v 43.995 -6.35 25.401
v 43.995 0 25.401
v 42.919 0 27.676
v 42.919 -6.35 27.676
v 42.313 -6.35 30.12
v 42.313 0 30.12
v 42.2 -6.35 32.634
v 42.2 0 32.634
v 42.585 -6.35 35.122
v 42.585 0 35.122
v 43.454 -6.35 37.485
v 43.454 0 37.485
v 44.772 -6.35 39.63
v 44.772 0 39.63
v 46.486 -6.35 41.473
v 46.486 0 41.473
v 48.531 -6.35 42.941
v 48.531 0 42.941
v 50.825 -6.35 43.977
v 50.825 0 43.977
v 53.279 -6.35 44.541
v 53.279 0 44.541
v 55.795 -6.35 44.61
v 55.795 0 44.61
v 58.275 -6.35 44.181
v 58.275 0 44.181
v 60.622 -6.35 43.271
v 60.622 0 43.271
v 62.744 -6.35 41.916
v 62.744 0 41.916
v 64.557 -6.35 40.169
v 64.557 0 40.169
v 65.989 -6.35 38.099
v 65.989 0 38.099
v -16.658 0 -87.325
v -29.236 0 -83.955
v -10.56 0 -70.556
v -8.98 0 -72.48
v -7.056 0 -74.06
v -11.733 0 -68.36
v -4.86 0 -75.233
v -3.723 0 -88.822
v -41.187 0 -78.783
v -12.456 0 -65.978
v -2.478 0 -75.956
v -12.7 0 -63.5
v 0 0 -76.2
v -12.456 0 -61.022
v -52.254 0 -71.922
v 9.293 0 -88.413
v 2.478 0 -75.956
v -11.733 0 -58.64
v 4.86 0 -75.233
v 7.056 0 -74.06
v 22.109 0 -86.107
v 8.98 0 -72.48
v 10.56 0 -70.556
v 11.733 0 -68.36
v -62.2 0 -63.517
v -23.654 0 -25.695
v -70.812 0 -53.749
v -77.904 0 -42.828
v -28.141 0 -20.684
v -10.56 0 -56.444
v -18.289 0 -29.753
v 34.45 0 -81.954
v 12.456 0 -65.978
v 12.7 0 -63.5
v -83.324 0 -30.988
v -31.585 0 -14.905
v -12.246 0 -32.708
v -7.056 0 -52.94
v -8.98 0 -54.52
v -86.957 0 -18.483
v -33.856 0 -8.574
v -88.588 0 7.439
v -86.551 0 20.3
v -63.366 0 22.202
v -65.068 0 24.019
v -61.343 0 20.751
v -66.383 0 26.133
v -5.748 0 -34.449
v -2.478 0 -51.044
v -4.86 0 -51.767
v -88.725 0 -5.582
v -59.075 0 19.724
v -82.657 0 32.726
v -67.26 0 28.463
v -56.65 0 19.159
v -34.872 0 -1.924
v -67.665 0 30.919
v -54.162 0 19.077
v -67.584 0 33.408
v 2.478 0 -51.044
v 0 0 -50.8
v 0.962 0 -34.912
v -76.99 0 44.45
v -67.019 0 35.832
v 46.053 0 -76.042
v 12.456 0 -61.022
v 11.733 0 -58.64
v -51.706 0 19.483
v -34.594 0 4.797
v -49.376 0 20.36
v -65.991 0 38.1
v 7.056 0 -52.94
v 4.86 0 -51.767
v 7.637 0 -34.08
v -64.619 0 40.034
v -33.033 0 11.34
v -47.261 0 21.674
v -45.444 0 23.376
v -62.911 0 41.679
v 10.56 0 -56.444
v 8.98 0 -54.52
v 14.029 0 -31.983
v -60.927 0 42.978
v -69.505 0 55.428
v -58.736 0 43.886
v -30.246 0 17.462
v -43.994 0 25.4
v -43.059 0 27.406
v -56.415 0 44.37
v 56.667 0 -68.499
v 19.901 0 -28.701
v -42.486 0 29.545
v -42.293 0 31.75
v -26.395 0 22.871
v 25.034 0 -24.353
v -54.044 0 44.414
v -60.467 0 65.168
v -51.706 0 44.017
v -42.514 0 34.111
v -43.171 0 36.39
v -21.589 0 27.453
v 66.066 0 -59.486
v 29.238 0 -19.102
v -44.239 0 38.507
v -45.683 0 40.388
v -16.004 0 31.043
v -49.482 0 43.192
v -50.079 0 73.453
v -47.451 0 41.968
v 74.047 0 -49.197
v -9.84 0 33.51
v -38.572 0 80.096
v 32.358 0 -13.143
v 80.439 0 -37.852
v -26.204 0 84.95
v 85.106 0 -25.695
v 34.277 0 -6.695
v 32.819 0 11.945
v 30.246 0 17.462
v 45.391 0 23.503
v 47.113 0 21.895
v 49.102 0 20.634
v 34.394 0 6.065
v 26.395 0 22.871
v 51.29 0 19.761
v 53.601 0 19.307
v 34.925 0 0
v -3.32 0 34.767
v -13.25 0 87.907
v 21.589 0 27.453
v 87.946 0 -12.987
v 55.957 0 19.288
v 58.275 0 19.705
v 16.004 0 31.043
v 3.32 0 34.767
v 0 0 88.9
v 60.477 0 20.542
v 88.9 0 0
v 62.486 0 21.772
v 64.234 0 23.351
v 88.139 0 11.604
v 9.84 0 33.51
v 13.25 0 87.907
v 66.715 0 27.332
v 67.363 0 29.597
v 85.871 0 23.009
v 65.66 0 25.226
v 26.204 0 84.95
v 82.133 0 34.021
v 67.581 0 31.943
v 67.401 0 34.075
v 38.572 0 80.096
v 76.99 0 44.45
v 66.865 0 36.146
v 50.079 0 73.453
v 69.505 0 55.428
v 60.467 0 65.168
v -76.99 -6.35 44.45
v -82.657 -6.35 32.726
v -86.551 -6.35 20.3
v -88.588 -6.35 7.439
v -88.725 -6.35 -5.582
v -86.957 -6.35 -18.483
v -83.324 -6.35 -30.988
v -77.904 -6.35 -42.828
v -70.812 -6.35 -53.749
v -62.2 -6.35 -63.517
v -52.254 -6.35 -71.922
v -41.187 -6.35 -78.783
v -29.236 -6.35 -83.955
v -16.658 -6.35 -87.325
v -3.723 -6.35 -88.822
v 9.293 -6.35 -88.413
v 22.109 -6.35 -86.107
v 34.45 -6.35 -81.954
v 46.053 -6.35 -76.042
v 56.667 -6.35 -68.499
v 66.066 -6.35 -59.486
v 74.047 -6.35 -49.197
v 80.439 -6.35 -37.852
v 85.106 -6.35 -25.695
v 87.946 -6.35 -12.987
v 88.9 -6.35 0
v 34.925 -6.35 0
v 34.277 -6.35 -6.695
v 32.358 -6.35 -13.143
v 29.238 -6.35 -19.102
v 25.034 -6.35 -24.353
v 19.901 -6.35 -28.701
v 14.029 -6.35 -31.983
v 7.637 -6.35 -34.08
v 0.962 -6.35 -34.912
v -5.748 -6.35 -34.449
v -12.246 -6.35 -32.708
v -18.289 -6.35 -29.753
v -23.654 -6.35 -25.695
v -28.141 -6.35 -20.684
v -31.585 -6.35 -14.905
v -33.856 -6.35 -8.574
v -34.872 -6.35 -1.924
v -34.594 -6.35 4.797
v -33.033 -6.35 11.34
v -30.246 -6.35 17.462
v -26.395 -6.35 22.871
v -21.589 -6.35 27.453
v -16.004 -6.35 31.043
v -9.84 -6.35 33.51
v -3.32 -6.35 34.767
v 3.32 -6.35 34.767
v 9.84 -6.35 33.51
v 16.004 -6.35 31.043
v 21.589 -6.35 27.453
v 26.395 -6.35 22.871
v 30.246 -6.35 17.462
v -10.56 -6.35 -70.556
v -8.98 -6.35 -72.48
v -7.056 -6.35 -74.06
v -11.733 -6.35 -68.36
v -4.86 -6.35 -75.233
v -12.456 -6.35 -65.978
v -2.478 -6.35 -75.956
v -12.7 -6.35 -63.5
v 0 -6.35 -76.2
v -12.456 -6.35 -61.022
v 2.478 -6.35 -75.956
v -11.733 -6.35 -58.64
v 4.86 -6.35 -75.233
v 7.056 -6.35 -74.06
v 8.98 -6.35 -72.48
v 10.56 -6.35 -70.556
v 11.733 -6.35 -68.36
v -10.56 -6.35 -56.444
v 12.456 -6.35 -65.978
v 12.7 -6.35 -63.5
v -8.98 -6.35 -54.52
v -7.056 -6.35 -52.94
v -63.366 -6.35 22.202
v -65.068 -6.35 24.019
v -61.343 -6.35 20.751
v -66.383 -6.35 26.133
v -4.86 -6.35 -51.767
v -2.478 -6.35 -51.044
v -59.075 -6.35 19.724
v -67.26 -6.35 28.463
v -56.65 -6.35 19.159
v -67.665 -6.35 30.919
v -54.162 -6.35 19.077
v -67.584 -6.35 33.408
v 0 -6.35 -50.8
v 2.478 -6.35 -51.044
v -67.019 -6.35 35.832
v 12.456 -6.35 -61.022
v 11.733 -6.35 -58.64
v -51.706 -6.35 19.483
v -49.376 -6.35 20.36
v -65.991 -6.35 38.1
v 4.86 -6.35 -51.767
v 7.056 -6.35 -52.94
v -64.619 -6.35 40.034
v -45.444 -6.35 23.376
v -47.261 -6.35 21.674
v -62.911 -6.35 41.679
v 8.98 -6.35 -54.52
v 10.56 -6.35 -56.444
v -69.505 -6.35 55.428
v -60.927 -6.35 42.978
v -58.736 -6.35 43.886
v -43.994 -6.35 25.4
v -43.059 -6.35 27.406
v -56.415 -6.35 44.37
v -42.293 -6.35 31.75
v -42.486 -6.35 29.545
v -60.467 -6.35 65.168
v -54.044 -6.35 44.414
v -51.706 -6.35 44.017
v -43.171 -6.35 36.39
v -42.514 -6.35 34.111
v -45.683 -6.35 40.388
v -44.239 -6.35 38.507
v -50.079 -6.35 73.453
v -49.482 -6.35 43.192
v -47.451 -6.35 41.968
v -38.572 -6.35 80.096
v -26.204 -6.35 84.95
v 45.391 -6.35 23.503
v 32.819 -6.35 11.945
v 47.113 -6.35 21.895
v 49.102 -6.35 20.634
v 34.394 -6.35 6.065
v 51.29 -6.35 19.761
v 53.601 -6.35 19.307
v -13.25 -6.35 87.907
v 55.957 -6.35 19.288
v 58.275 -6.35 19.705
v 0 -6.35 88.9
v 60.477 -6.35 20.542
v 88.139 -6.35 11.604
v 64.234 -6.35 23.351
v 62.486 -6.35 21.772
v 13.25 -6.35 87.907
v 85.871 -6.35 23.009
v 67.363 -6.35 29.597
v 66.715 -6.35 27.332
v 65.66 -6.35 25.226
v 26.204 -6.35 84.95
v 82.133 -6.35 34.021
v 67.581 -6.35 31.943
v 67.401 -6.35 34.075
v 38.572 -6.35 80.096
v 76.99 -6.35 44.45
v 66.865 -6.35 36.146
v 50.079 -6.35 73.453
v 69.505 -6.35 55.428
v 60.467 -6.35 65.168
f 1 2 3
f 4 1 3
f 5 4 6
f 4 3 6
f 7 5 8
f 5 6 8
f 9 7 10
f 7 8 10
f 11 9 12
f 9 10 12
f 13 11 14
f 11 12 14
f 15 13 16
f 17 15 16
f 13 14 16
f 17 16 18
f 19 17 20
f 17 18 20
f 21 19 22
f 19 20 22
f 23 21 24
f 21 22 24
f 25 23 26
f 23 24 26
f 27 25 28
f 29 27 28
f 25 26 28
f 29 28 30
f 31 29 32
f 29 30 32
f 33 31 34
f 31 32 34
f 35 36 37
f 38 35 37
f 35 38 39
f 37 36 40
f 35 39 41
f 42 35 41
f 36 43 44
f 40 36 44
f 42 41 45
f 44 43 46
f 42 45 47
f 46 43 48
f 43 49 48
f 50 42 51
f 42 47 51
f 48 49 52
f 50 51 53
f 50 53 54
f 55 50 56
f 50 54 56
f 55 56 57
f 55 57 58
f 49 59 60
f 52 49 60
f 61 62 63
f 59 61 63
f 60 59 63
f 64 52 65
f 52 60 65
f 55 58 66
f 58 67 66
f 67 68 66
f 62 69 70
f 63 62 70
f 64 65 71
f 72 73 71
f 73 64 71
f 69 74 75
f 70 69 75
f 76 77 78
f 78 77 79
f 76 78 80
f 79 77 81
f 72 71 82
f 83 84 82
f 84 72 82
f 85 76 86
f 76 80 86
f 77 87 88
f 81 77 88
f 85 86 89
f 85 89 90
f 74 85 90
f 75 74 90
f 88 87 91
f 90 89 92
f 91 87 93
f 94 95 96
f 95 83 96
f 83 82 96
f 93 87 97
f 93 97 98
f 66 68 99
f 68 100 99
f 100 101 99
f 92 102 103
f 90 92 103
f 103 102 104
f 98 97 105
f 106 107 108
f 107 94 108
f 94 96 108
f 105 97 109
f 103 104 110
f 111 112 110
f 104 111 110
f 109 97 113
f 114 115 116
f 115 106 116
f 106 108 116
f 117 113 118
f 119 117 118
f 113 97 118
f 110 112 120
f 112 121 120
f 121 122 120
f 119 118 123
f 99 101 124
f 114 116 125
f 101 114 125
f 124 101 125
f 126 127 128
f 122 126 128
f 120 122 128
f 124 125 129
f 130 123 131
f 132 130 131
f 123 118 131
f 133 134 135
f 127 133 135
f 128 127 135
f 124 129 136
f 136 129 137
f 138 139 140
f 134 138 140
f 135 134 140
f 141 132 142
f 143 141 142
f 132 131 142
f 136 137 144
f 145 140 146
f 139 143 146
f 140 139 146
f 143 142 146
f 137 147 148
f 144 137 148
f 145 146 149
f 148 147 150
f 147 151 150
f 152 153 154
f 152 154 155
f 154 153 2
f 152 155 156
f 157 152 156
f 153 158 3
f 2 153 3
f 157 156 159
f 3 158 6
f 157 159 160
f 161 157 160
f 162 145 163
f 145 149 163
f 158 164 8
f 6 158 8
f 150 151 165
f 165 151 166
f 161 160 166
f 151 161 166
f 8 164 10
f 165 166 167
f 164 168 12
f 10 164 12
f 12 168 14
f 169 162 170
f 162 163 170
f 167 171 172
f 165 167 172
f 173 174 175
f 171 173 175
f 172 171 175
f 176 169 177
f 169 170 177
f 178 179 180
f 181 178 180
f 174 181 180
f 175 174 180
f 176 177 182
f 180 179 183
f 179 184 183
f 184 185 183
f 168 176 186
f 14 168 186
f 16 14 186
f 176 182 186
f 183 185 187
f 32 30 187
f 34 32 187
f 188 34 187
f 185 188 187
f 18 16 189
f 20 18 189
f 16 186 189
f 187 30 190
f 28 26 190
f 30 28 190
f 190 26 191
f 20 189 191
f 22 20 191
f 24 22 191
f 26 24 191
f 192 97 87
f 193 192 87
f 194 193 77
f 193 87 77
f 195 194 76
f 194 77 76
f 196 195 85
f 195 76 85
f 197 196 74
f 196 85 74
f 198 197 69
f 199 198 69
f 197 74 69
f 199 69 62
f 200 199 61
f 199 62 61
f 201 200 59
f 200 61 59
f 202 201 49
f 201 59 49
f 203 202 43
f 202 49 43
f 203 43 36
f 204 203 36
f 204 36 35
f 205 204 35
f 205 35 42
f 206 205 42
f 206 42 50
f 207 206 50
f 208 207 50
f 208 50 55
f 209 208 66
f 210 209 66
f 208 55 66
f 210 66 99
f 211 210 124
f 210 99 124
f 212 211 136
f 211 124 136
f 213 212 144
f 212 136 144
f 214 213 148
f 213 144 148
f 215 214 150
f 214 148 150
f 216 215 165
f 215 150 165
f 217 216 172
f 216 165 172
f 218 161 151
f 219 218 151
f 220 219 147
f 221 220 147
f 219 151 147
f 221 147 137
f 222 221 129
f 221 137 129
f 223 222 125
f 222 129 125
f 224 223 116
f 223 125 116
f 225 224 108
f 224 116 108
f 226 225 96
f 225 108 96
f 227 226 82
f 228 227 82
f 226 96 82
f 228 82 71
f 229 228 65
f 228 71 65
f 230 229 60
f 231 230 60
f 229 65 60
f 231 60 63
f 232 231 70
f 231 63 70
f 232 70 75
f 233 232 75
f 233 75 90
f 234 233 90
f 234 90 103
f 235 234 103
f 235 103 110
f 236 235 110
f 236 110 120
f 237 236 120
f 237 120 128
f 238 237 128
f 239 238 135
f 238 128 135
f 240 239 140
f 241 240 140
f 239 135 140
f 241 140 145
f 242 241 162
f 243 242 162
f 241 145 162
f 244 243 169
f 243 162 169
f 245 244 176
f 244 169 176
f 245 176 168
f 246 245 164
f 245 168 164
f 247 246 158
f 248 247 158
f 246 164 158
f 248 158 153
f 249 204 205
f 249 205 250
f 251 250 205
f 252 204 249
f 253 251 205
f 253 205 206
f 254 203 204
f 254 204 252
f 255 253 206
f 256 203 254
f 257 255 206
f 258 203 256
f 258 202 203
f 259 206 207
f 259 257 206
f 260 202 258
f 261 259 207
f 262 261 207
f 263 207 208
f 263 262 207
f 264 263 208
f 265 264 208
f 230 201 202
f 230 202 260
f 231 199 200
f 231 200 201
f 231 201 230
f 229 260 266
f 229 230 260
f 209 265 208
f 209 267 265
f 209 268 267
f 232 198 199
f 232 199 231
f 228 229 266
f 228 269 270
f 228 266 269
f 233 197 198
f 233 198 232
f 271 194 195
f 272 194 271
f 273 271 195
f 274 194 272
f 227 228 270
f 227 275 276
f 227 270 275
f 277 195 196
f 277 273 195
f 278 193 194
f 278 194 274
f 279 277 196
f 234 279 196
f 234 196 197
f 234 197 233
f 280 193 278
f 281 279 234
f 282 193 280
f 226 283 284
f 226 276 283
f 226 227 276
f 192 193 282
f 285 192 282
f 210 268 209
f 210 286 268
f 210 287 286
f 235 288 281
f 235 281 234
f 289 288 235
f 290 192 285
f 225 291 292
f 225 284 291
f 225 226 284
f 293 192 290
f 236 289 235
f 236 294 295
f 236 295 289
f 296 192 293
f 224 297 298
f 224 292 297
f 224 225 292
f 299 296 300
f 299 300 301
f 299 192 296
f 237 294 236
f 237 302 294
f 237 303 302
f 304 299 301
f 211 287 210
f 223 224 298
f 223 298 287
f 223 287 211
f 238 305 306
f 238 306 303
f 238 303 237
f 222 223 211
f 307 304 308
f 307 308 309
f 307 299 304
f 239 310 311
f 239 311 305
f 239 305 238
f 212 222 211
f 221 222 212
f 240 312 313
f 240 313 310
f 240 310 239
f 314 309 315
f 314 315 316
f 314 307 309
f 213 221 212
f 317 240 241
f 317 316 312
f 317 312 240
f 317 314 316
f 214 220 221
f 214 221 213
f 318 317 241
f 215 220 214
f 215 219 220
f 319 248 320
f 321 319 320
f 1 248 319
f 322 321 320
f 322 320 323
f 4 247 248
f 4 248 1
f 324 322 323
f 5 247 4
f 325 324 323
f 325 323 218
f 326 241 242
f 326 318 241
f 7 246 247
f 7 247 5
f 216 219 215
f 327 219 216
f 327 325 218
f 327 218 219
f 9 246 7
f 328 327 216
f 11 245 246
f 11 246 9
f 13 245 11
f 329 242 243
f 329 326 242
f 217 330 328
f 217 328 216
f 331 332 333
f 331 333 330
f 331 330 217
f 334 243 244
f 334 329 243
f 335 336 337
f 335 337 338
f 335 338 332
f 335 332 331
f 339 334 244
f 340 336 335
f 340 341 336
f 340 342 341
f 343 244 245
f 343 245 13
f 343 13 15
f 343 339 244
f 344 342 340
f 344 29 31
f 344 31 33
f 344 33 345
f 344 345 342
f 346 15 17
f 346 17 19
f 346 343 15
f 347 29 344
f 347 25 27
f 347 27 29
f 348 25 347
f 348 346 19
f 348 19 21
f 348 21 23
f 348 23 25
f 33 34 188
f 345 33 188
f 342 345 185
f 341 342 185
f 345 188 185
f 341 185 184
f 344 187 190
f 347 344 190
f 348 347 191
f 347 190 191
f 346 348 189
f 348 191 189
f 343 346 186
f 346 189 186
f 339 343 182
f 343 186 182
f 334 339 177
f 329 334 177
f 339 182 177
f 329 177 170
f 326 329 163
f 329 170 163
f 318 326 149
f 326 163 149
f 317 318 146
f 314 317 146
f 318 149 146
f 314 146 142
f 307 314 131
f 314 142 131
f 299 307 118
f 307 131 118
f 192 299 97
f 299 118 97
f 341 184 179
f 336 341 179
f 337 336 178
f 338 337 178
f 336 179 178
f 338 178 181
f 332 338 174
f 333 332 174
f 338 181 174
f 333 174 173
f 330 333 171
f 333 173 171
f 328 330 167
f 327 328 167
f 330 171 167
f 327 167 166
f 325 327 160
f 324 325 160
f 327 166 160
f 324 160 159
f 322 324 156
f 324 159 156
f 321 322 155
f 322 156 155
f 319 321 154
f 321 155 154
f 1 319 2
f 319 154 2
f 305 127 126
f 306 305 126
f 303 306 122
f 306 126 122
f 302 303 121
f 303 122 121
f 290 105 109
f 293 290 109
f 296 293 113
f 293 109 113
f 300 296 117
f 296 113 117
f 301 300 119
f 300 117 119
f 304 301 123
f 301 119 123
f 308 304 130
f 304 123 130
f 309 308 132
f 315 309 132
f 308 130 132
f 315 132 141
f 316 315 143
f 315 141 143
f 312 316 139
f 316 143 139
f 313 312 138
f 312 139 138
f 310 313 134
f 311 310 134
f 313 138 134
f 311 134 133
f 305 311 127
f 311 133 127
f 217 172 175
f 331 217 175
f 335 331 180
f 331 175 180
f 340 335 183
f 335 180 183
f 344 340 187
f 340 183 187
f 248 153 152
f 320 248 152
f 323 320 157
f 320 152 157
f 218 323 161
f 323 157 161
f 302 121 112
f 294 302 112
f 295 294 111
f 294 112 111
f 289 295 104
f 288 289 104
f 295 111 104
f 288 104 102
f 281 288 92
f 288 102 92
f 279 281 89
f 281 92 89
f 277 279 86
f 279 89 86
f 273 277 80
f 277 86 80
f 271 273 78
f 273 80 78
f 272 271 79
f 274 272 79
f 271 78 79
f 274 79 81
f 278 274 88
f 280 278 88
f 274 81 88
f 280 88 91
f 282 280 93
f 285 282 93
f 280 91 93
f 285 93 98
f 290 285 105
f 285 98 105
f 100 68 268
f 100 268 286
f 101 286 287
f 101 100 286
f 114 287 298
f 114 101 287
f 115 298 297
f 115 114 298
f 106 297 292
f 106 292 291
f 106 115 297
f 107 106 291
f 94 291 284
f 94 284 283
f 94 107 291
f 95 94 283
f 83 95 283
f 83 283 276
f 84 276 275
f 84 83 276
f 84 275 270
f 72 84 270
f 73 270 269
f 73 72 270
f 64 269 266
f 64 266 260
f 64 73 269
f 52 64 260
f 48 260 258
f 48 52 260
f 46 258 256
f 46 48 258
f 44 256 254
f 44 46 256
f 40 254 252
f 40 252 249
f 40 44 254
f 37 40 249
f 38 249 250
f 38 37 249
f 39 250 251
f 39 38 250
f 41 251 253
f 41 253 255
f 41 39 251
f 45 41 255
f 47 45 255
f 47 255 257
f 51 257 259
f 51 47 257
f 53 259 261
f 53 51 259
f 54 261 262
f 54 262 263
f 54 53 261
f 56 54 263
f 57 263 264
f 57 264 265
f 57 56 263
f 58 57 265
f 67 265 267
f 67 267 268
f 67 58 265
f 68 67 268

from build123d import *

# Parameters (mm, degrees)
F0_R     = 12.7
F1_DEPTH = 6.35


with BuildPart() as f1:
    # F0 (on Front) → F1 (new body)
    with BuildSketch(Plane.XZ):
        with BuildLine():
            Line((43.995441, 25.40078), (30.245937, 17.4625))
            ThreePointArc((30.245937, 17.4625), (33.734959, 9.039255), (34.925, 0))
            ThreePointArc((34.925, 0), (-9.039255, -33.734959), (-30.245937, 17.4625))
            Line((-30.245937, 17.4625), (-43.994091, 25.4))
            ThreePointArc((-43.994091, 25.4), (-61.342613, 20.751477), (-65.991136, 38.1))
            Line((-65.991136, 38.1), (-76.989658, 44.45))
            ThreePointArc((-76.989658, 44.45), (-23.009013, -85.870806), (88.9, 0))
            ThreePointArc((88.9, 0), (85.870806, 23.009013), (76.989658, 44.45))
            Line((76.989658, 44.45), (65.98911, 38.09883))
            ThreePointArc((65.98911, 38.09883), (67.176599, 35.121917), (67.581014, 31.942516))
            ThreePointArc((67.581014, 31.942516), (58.275364, 19.704527), (43.995441, 25.40078))
        make_face()
        with Locations((0, -63.5)):
            Circle(F0_R, mode=Mode.SUBTRACT)
        with BuildLine():
            ThreePointArc((-30.245937, 17.4625), (0, 34.925), (30.245937, 17.4625))
            Line((30.245937, 17.4625), (43.995441, 25.40078))
            ThreePointArc((43.995441, 25.40078), (48.531014, 42.941039), (65.98911, 38.09883))
            Line((65.98911, 38.09883), (76.989658, 44.45))
            ThreePointArc((76.989658, 44.45), (0, 88.9), (-76.989658, 44.45))
            Line((-76.989658, 44.45), (-65.991136, 38.1))
            ThreePointArc((-65.991136, 38.1), (-51.705611, 44.017258), (-42.292613, 31.75))
            ThreePointArc((-42.292613, 31.75), (-42.725355, 28.462998), (-43.994091, 25.4))
            Line((-43.994091, 25.4), (-30.245937, 17.4625))
        make_face()
    extrude(amount=F1_DEPTH)


solid = f1.part
